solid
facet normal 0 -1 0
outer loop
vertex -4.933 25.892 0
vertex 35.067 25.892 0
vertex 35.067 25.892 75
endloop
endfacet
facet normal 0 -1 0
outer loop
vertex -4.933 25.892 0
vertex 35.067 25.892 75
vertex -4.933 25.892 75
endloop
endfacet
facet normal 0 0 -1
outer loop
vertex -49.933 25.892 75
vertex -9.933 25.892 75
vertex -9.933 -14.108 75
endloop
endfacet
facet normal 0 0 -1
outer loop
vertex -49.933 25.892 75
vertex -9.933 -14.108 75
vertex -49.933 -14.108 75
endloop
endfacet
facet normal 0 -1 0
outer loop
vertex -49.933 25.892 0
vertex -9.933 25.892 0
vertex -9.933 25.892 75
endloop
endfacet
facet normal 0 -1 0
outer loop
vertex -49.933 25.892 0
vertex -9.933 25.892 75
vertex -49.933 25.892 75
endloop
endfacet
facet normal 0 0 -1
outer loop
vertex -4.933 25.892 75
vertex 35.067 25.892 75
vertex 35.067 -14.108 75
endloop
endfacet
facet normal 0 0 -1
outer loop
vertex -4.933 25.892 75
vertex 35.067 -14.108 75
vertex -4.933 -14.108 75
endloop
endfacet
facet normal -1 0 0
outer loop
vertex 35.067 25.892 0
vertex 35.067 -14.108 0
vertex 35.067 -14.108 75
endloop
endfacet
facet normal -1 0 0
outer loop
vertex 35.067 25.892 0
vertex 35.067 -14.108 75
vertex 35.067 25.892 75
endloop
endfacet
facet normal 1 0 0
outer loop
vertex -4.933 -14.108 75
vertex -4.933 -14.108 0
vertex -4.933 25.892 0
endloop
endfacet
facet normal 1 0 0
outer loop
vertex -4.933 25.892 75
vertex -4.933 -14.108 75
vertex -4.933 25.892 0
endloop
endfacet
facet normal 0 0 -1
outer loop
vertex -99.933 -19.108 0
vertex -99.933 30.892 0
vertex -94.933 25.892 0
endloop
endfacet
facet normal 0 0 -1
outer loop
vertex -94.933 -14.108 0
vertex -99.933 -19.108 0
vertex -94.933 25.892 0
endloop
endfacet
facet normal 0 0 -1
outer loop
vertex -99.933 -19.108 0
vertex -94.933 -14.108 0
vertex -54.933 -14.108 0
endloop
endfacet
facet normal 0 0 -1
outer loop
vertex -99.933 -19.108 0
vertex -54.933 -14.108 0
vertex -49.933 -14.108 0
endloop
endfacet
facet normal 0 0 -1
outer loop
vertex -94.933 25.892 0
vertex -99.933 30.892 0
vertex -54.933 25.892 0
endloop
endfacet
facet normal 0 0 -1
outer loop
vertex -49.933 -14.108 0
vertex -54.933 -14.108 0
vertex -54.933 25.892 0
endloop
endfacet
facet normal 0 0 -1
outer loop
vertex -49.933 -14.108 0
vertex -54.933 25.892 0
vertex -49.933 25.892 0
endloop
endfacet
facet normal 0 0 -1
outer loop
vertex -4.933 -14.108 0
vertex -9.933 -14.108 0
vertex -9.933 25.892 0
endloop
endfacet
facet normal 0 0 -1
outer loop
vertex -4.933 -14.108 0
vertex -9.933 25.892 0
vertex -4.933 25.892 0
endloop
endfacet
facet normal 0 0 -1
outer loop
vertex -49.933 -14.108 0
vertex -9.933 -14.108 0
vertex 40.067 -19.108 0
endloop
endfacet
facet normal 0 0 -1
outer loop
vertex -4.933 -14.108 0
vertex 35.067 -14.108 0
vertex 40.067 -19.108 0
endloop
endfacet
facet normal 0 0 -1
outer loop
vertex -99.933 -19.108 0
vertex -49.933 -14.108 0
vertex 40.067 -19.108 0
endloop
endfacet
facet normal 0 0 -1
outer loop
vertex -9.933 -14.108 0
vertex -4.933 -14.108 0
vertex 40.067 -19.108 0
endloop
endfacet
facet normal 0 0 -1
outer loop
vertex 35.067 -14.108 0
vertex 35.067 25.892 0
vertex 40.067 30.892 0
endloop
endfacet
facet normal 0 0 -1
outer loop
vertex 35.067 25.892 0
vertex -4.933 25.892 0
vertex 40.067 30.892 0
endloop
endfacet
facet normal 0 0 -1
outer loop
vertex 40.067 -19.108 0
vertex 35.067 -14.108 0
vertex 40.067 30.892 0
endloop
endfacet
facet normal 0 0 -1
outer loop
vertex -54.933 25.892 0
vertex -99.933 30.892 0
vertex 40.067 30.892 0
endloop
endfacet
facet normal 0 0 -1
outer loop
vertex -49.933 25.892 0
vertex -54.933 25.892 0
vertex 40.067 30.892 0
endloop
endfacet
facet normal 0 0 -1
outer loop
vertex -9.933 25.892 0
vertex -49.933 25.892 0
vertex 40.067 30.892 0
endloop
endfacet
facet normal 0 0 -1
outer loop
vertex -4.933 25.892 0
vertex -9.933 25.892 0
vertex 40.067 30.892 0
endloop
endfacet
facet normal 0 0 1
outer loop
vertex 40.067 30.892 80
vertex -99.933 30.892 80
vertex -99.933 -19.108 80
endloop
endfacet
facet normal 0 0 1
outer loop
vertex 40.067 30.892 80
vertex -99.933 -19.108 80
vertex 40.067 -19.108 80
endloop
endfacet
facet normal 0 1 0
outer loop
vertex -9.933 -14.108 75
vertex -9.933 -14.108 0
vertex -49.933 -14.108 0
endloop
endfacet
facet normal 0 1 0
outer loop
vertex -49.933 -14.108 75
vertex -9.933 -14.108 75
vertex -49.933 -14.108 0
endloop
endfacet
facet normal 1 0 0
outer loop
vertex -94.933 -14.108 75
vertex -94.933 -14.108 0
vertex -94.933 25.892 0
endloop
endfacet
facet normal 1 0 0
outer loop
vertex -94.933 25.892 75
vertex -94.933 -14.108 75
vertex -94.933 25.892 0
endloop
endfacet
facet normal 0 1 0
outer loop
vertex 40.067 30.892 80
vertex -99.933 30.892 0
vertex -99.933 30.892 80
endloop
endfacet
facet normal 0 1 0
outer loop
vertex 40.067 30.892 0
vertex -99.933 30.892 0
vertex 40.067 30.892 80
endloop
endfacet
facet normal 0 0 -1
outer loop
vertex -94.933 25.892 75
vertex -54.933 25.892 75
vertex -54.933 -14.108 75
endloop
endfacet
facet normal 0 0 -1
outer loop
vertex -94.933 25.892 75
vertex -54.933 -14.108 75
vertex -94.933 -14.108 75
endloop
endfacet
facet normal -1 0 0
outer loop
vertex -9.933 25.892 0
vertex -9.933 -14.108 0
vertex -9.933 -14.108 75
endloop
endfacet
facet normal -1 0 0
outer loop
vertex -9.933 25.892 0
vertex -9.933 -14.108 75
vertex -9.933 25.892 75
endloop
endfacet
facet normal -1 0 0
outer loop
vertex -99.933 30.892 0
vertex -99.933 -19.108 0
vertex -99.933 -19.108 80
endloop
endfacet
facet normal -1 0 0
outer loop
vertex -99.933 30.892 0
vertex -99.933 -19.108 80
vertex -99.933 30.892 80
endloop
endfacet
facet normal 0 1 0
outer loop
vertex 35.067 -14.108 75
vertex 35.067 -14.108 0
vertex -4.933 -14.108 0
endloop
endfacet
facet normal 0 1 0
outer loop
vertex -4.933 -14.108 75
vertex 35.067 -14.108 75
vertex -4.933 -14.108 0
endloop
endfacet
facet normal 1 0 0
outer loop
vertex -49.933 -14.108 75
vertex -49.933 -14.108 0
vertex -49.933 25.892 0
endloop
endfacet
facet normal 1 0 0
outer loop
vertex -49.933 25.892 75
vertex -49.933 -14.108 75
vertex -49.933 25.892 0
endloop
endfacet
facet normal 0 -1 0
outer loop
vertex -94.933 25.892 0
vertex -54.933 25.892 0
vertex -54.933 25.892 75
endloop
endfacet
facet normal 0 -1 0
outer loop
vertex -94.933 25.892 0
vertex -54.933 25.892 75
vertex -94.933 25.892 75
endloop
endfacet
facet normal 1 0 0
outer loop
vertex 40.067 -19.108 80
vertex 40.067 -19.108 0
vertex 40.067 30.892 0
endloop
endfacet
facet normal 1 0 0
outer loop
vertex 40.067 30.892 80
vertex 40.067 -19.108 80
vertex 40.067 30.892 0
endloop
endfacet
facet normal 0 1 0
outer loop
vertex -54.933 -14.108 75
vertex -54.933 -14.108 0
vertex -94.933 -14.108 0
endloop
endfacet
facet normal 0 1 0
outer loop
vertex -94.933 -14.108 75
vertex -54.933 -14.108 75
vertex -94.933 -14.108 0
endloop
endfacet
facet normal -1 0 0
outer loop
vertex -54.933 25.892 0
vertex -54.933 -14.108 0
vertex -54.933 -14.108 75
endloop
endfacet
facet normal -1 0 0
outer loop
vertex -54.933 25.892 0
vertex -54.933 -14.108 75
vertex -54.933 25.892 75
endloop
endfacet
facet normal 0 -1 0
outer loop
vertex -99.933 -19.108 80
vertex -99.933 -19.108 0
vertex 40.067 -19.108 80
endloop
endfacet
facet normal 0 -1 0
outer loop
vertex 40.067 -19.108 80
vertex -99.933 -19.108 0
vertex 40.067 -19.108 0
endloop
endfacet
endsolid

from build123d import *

# Parameters (mm, degrees)
SKETCH_1_W          = 140
SKETCH_1_H          = 50
EXTRUDE_1_DEPTH     = 80
SKETCH_3_W          = 40
SKETCH_3_H          = 40
CUT_EXTRUDE_3_DEPTH = 75


with BuildPart() as part:
    # 草图1 → 凸台-拉伸1 (new body)
    with BuildSketch(Plane.XY):
        with Locations((-29.932659933, 5.892255892)):
            Rectangle(SKETCH_1_W, SKETCH_1_H)
    extrude(amount=EXTRUDE_1_DEPTH)

    # 草图3 → 切除-拉伸3 (cut)
    with BuildSketch(Plane(origin=(0, 0, 0), x_dir=(-1, 0, 0), z_dir=(0, 0, -1))):
        with Locations((29.932659933, 5.892255892)):
            Rectangle(SKETCH_3_W, SKETCH_3_H)
        with Locations((-15.067340067, 5.892255892)):
            Rectangle(SKETCH_3_W, SKETCH_3_H)
        with Locations((74.932659933, 5.892255892)):
            Rectangle(SKETCH_3_W, SKETCH_3_H)
    extrude(amount=-CUT_EXTRUDE_3_DEPTH, mode=Mode.SUBTRACT)


solid = part.part
